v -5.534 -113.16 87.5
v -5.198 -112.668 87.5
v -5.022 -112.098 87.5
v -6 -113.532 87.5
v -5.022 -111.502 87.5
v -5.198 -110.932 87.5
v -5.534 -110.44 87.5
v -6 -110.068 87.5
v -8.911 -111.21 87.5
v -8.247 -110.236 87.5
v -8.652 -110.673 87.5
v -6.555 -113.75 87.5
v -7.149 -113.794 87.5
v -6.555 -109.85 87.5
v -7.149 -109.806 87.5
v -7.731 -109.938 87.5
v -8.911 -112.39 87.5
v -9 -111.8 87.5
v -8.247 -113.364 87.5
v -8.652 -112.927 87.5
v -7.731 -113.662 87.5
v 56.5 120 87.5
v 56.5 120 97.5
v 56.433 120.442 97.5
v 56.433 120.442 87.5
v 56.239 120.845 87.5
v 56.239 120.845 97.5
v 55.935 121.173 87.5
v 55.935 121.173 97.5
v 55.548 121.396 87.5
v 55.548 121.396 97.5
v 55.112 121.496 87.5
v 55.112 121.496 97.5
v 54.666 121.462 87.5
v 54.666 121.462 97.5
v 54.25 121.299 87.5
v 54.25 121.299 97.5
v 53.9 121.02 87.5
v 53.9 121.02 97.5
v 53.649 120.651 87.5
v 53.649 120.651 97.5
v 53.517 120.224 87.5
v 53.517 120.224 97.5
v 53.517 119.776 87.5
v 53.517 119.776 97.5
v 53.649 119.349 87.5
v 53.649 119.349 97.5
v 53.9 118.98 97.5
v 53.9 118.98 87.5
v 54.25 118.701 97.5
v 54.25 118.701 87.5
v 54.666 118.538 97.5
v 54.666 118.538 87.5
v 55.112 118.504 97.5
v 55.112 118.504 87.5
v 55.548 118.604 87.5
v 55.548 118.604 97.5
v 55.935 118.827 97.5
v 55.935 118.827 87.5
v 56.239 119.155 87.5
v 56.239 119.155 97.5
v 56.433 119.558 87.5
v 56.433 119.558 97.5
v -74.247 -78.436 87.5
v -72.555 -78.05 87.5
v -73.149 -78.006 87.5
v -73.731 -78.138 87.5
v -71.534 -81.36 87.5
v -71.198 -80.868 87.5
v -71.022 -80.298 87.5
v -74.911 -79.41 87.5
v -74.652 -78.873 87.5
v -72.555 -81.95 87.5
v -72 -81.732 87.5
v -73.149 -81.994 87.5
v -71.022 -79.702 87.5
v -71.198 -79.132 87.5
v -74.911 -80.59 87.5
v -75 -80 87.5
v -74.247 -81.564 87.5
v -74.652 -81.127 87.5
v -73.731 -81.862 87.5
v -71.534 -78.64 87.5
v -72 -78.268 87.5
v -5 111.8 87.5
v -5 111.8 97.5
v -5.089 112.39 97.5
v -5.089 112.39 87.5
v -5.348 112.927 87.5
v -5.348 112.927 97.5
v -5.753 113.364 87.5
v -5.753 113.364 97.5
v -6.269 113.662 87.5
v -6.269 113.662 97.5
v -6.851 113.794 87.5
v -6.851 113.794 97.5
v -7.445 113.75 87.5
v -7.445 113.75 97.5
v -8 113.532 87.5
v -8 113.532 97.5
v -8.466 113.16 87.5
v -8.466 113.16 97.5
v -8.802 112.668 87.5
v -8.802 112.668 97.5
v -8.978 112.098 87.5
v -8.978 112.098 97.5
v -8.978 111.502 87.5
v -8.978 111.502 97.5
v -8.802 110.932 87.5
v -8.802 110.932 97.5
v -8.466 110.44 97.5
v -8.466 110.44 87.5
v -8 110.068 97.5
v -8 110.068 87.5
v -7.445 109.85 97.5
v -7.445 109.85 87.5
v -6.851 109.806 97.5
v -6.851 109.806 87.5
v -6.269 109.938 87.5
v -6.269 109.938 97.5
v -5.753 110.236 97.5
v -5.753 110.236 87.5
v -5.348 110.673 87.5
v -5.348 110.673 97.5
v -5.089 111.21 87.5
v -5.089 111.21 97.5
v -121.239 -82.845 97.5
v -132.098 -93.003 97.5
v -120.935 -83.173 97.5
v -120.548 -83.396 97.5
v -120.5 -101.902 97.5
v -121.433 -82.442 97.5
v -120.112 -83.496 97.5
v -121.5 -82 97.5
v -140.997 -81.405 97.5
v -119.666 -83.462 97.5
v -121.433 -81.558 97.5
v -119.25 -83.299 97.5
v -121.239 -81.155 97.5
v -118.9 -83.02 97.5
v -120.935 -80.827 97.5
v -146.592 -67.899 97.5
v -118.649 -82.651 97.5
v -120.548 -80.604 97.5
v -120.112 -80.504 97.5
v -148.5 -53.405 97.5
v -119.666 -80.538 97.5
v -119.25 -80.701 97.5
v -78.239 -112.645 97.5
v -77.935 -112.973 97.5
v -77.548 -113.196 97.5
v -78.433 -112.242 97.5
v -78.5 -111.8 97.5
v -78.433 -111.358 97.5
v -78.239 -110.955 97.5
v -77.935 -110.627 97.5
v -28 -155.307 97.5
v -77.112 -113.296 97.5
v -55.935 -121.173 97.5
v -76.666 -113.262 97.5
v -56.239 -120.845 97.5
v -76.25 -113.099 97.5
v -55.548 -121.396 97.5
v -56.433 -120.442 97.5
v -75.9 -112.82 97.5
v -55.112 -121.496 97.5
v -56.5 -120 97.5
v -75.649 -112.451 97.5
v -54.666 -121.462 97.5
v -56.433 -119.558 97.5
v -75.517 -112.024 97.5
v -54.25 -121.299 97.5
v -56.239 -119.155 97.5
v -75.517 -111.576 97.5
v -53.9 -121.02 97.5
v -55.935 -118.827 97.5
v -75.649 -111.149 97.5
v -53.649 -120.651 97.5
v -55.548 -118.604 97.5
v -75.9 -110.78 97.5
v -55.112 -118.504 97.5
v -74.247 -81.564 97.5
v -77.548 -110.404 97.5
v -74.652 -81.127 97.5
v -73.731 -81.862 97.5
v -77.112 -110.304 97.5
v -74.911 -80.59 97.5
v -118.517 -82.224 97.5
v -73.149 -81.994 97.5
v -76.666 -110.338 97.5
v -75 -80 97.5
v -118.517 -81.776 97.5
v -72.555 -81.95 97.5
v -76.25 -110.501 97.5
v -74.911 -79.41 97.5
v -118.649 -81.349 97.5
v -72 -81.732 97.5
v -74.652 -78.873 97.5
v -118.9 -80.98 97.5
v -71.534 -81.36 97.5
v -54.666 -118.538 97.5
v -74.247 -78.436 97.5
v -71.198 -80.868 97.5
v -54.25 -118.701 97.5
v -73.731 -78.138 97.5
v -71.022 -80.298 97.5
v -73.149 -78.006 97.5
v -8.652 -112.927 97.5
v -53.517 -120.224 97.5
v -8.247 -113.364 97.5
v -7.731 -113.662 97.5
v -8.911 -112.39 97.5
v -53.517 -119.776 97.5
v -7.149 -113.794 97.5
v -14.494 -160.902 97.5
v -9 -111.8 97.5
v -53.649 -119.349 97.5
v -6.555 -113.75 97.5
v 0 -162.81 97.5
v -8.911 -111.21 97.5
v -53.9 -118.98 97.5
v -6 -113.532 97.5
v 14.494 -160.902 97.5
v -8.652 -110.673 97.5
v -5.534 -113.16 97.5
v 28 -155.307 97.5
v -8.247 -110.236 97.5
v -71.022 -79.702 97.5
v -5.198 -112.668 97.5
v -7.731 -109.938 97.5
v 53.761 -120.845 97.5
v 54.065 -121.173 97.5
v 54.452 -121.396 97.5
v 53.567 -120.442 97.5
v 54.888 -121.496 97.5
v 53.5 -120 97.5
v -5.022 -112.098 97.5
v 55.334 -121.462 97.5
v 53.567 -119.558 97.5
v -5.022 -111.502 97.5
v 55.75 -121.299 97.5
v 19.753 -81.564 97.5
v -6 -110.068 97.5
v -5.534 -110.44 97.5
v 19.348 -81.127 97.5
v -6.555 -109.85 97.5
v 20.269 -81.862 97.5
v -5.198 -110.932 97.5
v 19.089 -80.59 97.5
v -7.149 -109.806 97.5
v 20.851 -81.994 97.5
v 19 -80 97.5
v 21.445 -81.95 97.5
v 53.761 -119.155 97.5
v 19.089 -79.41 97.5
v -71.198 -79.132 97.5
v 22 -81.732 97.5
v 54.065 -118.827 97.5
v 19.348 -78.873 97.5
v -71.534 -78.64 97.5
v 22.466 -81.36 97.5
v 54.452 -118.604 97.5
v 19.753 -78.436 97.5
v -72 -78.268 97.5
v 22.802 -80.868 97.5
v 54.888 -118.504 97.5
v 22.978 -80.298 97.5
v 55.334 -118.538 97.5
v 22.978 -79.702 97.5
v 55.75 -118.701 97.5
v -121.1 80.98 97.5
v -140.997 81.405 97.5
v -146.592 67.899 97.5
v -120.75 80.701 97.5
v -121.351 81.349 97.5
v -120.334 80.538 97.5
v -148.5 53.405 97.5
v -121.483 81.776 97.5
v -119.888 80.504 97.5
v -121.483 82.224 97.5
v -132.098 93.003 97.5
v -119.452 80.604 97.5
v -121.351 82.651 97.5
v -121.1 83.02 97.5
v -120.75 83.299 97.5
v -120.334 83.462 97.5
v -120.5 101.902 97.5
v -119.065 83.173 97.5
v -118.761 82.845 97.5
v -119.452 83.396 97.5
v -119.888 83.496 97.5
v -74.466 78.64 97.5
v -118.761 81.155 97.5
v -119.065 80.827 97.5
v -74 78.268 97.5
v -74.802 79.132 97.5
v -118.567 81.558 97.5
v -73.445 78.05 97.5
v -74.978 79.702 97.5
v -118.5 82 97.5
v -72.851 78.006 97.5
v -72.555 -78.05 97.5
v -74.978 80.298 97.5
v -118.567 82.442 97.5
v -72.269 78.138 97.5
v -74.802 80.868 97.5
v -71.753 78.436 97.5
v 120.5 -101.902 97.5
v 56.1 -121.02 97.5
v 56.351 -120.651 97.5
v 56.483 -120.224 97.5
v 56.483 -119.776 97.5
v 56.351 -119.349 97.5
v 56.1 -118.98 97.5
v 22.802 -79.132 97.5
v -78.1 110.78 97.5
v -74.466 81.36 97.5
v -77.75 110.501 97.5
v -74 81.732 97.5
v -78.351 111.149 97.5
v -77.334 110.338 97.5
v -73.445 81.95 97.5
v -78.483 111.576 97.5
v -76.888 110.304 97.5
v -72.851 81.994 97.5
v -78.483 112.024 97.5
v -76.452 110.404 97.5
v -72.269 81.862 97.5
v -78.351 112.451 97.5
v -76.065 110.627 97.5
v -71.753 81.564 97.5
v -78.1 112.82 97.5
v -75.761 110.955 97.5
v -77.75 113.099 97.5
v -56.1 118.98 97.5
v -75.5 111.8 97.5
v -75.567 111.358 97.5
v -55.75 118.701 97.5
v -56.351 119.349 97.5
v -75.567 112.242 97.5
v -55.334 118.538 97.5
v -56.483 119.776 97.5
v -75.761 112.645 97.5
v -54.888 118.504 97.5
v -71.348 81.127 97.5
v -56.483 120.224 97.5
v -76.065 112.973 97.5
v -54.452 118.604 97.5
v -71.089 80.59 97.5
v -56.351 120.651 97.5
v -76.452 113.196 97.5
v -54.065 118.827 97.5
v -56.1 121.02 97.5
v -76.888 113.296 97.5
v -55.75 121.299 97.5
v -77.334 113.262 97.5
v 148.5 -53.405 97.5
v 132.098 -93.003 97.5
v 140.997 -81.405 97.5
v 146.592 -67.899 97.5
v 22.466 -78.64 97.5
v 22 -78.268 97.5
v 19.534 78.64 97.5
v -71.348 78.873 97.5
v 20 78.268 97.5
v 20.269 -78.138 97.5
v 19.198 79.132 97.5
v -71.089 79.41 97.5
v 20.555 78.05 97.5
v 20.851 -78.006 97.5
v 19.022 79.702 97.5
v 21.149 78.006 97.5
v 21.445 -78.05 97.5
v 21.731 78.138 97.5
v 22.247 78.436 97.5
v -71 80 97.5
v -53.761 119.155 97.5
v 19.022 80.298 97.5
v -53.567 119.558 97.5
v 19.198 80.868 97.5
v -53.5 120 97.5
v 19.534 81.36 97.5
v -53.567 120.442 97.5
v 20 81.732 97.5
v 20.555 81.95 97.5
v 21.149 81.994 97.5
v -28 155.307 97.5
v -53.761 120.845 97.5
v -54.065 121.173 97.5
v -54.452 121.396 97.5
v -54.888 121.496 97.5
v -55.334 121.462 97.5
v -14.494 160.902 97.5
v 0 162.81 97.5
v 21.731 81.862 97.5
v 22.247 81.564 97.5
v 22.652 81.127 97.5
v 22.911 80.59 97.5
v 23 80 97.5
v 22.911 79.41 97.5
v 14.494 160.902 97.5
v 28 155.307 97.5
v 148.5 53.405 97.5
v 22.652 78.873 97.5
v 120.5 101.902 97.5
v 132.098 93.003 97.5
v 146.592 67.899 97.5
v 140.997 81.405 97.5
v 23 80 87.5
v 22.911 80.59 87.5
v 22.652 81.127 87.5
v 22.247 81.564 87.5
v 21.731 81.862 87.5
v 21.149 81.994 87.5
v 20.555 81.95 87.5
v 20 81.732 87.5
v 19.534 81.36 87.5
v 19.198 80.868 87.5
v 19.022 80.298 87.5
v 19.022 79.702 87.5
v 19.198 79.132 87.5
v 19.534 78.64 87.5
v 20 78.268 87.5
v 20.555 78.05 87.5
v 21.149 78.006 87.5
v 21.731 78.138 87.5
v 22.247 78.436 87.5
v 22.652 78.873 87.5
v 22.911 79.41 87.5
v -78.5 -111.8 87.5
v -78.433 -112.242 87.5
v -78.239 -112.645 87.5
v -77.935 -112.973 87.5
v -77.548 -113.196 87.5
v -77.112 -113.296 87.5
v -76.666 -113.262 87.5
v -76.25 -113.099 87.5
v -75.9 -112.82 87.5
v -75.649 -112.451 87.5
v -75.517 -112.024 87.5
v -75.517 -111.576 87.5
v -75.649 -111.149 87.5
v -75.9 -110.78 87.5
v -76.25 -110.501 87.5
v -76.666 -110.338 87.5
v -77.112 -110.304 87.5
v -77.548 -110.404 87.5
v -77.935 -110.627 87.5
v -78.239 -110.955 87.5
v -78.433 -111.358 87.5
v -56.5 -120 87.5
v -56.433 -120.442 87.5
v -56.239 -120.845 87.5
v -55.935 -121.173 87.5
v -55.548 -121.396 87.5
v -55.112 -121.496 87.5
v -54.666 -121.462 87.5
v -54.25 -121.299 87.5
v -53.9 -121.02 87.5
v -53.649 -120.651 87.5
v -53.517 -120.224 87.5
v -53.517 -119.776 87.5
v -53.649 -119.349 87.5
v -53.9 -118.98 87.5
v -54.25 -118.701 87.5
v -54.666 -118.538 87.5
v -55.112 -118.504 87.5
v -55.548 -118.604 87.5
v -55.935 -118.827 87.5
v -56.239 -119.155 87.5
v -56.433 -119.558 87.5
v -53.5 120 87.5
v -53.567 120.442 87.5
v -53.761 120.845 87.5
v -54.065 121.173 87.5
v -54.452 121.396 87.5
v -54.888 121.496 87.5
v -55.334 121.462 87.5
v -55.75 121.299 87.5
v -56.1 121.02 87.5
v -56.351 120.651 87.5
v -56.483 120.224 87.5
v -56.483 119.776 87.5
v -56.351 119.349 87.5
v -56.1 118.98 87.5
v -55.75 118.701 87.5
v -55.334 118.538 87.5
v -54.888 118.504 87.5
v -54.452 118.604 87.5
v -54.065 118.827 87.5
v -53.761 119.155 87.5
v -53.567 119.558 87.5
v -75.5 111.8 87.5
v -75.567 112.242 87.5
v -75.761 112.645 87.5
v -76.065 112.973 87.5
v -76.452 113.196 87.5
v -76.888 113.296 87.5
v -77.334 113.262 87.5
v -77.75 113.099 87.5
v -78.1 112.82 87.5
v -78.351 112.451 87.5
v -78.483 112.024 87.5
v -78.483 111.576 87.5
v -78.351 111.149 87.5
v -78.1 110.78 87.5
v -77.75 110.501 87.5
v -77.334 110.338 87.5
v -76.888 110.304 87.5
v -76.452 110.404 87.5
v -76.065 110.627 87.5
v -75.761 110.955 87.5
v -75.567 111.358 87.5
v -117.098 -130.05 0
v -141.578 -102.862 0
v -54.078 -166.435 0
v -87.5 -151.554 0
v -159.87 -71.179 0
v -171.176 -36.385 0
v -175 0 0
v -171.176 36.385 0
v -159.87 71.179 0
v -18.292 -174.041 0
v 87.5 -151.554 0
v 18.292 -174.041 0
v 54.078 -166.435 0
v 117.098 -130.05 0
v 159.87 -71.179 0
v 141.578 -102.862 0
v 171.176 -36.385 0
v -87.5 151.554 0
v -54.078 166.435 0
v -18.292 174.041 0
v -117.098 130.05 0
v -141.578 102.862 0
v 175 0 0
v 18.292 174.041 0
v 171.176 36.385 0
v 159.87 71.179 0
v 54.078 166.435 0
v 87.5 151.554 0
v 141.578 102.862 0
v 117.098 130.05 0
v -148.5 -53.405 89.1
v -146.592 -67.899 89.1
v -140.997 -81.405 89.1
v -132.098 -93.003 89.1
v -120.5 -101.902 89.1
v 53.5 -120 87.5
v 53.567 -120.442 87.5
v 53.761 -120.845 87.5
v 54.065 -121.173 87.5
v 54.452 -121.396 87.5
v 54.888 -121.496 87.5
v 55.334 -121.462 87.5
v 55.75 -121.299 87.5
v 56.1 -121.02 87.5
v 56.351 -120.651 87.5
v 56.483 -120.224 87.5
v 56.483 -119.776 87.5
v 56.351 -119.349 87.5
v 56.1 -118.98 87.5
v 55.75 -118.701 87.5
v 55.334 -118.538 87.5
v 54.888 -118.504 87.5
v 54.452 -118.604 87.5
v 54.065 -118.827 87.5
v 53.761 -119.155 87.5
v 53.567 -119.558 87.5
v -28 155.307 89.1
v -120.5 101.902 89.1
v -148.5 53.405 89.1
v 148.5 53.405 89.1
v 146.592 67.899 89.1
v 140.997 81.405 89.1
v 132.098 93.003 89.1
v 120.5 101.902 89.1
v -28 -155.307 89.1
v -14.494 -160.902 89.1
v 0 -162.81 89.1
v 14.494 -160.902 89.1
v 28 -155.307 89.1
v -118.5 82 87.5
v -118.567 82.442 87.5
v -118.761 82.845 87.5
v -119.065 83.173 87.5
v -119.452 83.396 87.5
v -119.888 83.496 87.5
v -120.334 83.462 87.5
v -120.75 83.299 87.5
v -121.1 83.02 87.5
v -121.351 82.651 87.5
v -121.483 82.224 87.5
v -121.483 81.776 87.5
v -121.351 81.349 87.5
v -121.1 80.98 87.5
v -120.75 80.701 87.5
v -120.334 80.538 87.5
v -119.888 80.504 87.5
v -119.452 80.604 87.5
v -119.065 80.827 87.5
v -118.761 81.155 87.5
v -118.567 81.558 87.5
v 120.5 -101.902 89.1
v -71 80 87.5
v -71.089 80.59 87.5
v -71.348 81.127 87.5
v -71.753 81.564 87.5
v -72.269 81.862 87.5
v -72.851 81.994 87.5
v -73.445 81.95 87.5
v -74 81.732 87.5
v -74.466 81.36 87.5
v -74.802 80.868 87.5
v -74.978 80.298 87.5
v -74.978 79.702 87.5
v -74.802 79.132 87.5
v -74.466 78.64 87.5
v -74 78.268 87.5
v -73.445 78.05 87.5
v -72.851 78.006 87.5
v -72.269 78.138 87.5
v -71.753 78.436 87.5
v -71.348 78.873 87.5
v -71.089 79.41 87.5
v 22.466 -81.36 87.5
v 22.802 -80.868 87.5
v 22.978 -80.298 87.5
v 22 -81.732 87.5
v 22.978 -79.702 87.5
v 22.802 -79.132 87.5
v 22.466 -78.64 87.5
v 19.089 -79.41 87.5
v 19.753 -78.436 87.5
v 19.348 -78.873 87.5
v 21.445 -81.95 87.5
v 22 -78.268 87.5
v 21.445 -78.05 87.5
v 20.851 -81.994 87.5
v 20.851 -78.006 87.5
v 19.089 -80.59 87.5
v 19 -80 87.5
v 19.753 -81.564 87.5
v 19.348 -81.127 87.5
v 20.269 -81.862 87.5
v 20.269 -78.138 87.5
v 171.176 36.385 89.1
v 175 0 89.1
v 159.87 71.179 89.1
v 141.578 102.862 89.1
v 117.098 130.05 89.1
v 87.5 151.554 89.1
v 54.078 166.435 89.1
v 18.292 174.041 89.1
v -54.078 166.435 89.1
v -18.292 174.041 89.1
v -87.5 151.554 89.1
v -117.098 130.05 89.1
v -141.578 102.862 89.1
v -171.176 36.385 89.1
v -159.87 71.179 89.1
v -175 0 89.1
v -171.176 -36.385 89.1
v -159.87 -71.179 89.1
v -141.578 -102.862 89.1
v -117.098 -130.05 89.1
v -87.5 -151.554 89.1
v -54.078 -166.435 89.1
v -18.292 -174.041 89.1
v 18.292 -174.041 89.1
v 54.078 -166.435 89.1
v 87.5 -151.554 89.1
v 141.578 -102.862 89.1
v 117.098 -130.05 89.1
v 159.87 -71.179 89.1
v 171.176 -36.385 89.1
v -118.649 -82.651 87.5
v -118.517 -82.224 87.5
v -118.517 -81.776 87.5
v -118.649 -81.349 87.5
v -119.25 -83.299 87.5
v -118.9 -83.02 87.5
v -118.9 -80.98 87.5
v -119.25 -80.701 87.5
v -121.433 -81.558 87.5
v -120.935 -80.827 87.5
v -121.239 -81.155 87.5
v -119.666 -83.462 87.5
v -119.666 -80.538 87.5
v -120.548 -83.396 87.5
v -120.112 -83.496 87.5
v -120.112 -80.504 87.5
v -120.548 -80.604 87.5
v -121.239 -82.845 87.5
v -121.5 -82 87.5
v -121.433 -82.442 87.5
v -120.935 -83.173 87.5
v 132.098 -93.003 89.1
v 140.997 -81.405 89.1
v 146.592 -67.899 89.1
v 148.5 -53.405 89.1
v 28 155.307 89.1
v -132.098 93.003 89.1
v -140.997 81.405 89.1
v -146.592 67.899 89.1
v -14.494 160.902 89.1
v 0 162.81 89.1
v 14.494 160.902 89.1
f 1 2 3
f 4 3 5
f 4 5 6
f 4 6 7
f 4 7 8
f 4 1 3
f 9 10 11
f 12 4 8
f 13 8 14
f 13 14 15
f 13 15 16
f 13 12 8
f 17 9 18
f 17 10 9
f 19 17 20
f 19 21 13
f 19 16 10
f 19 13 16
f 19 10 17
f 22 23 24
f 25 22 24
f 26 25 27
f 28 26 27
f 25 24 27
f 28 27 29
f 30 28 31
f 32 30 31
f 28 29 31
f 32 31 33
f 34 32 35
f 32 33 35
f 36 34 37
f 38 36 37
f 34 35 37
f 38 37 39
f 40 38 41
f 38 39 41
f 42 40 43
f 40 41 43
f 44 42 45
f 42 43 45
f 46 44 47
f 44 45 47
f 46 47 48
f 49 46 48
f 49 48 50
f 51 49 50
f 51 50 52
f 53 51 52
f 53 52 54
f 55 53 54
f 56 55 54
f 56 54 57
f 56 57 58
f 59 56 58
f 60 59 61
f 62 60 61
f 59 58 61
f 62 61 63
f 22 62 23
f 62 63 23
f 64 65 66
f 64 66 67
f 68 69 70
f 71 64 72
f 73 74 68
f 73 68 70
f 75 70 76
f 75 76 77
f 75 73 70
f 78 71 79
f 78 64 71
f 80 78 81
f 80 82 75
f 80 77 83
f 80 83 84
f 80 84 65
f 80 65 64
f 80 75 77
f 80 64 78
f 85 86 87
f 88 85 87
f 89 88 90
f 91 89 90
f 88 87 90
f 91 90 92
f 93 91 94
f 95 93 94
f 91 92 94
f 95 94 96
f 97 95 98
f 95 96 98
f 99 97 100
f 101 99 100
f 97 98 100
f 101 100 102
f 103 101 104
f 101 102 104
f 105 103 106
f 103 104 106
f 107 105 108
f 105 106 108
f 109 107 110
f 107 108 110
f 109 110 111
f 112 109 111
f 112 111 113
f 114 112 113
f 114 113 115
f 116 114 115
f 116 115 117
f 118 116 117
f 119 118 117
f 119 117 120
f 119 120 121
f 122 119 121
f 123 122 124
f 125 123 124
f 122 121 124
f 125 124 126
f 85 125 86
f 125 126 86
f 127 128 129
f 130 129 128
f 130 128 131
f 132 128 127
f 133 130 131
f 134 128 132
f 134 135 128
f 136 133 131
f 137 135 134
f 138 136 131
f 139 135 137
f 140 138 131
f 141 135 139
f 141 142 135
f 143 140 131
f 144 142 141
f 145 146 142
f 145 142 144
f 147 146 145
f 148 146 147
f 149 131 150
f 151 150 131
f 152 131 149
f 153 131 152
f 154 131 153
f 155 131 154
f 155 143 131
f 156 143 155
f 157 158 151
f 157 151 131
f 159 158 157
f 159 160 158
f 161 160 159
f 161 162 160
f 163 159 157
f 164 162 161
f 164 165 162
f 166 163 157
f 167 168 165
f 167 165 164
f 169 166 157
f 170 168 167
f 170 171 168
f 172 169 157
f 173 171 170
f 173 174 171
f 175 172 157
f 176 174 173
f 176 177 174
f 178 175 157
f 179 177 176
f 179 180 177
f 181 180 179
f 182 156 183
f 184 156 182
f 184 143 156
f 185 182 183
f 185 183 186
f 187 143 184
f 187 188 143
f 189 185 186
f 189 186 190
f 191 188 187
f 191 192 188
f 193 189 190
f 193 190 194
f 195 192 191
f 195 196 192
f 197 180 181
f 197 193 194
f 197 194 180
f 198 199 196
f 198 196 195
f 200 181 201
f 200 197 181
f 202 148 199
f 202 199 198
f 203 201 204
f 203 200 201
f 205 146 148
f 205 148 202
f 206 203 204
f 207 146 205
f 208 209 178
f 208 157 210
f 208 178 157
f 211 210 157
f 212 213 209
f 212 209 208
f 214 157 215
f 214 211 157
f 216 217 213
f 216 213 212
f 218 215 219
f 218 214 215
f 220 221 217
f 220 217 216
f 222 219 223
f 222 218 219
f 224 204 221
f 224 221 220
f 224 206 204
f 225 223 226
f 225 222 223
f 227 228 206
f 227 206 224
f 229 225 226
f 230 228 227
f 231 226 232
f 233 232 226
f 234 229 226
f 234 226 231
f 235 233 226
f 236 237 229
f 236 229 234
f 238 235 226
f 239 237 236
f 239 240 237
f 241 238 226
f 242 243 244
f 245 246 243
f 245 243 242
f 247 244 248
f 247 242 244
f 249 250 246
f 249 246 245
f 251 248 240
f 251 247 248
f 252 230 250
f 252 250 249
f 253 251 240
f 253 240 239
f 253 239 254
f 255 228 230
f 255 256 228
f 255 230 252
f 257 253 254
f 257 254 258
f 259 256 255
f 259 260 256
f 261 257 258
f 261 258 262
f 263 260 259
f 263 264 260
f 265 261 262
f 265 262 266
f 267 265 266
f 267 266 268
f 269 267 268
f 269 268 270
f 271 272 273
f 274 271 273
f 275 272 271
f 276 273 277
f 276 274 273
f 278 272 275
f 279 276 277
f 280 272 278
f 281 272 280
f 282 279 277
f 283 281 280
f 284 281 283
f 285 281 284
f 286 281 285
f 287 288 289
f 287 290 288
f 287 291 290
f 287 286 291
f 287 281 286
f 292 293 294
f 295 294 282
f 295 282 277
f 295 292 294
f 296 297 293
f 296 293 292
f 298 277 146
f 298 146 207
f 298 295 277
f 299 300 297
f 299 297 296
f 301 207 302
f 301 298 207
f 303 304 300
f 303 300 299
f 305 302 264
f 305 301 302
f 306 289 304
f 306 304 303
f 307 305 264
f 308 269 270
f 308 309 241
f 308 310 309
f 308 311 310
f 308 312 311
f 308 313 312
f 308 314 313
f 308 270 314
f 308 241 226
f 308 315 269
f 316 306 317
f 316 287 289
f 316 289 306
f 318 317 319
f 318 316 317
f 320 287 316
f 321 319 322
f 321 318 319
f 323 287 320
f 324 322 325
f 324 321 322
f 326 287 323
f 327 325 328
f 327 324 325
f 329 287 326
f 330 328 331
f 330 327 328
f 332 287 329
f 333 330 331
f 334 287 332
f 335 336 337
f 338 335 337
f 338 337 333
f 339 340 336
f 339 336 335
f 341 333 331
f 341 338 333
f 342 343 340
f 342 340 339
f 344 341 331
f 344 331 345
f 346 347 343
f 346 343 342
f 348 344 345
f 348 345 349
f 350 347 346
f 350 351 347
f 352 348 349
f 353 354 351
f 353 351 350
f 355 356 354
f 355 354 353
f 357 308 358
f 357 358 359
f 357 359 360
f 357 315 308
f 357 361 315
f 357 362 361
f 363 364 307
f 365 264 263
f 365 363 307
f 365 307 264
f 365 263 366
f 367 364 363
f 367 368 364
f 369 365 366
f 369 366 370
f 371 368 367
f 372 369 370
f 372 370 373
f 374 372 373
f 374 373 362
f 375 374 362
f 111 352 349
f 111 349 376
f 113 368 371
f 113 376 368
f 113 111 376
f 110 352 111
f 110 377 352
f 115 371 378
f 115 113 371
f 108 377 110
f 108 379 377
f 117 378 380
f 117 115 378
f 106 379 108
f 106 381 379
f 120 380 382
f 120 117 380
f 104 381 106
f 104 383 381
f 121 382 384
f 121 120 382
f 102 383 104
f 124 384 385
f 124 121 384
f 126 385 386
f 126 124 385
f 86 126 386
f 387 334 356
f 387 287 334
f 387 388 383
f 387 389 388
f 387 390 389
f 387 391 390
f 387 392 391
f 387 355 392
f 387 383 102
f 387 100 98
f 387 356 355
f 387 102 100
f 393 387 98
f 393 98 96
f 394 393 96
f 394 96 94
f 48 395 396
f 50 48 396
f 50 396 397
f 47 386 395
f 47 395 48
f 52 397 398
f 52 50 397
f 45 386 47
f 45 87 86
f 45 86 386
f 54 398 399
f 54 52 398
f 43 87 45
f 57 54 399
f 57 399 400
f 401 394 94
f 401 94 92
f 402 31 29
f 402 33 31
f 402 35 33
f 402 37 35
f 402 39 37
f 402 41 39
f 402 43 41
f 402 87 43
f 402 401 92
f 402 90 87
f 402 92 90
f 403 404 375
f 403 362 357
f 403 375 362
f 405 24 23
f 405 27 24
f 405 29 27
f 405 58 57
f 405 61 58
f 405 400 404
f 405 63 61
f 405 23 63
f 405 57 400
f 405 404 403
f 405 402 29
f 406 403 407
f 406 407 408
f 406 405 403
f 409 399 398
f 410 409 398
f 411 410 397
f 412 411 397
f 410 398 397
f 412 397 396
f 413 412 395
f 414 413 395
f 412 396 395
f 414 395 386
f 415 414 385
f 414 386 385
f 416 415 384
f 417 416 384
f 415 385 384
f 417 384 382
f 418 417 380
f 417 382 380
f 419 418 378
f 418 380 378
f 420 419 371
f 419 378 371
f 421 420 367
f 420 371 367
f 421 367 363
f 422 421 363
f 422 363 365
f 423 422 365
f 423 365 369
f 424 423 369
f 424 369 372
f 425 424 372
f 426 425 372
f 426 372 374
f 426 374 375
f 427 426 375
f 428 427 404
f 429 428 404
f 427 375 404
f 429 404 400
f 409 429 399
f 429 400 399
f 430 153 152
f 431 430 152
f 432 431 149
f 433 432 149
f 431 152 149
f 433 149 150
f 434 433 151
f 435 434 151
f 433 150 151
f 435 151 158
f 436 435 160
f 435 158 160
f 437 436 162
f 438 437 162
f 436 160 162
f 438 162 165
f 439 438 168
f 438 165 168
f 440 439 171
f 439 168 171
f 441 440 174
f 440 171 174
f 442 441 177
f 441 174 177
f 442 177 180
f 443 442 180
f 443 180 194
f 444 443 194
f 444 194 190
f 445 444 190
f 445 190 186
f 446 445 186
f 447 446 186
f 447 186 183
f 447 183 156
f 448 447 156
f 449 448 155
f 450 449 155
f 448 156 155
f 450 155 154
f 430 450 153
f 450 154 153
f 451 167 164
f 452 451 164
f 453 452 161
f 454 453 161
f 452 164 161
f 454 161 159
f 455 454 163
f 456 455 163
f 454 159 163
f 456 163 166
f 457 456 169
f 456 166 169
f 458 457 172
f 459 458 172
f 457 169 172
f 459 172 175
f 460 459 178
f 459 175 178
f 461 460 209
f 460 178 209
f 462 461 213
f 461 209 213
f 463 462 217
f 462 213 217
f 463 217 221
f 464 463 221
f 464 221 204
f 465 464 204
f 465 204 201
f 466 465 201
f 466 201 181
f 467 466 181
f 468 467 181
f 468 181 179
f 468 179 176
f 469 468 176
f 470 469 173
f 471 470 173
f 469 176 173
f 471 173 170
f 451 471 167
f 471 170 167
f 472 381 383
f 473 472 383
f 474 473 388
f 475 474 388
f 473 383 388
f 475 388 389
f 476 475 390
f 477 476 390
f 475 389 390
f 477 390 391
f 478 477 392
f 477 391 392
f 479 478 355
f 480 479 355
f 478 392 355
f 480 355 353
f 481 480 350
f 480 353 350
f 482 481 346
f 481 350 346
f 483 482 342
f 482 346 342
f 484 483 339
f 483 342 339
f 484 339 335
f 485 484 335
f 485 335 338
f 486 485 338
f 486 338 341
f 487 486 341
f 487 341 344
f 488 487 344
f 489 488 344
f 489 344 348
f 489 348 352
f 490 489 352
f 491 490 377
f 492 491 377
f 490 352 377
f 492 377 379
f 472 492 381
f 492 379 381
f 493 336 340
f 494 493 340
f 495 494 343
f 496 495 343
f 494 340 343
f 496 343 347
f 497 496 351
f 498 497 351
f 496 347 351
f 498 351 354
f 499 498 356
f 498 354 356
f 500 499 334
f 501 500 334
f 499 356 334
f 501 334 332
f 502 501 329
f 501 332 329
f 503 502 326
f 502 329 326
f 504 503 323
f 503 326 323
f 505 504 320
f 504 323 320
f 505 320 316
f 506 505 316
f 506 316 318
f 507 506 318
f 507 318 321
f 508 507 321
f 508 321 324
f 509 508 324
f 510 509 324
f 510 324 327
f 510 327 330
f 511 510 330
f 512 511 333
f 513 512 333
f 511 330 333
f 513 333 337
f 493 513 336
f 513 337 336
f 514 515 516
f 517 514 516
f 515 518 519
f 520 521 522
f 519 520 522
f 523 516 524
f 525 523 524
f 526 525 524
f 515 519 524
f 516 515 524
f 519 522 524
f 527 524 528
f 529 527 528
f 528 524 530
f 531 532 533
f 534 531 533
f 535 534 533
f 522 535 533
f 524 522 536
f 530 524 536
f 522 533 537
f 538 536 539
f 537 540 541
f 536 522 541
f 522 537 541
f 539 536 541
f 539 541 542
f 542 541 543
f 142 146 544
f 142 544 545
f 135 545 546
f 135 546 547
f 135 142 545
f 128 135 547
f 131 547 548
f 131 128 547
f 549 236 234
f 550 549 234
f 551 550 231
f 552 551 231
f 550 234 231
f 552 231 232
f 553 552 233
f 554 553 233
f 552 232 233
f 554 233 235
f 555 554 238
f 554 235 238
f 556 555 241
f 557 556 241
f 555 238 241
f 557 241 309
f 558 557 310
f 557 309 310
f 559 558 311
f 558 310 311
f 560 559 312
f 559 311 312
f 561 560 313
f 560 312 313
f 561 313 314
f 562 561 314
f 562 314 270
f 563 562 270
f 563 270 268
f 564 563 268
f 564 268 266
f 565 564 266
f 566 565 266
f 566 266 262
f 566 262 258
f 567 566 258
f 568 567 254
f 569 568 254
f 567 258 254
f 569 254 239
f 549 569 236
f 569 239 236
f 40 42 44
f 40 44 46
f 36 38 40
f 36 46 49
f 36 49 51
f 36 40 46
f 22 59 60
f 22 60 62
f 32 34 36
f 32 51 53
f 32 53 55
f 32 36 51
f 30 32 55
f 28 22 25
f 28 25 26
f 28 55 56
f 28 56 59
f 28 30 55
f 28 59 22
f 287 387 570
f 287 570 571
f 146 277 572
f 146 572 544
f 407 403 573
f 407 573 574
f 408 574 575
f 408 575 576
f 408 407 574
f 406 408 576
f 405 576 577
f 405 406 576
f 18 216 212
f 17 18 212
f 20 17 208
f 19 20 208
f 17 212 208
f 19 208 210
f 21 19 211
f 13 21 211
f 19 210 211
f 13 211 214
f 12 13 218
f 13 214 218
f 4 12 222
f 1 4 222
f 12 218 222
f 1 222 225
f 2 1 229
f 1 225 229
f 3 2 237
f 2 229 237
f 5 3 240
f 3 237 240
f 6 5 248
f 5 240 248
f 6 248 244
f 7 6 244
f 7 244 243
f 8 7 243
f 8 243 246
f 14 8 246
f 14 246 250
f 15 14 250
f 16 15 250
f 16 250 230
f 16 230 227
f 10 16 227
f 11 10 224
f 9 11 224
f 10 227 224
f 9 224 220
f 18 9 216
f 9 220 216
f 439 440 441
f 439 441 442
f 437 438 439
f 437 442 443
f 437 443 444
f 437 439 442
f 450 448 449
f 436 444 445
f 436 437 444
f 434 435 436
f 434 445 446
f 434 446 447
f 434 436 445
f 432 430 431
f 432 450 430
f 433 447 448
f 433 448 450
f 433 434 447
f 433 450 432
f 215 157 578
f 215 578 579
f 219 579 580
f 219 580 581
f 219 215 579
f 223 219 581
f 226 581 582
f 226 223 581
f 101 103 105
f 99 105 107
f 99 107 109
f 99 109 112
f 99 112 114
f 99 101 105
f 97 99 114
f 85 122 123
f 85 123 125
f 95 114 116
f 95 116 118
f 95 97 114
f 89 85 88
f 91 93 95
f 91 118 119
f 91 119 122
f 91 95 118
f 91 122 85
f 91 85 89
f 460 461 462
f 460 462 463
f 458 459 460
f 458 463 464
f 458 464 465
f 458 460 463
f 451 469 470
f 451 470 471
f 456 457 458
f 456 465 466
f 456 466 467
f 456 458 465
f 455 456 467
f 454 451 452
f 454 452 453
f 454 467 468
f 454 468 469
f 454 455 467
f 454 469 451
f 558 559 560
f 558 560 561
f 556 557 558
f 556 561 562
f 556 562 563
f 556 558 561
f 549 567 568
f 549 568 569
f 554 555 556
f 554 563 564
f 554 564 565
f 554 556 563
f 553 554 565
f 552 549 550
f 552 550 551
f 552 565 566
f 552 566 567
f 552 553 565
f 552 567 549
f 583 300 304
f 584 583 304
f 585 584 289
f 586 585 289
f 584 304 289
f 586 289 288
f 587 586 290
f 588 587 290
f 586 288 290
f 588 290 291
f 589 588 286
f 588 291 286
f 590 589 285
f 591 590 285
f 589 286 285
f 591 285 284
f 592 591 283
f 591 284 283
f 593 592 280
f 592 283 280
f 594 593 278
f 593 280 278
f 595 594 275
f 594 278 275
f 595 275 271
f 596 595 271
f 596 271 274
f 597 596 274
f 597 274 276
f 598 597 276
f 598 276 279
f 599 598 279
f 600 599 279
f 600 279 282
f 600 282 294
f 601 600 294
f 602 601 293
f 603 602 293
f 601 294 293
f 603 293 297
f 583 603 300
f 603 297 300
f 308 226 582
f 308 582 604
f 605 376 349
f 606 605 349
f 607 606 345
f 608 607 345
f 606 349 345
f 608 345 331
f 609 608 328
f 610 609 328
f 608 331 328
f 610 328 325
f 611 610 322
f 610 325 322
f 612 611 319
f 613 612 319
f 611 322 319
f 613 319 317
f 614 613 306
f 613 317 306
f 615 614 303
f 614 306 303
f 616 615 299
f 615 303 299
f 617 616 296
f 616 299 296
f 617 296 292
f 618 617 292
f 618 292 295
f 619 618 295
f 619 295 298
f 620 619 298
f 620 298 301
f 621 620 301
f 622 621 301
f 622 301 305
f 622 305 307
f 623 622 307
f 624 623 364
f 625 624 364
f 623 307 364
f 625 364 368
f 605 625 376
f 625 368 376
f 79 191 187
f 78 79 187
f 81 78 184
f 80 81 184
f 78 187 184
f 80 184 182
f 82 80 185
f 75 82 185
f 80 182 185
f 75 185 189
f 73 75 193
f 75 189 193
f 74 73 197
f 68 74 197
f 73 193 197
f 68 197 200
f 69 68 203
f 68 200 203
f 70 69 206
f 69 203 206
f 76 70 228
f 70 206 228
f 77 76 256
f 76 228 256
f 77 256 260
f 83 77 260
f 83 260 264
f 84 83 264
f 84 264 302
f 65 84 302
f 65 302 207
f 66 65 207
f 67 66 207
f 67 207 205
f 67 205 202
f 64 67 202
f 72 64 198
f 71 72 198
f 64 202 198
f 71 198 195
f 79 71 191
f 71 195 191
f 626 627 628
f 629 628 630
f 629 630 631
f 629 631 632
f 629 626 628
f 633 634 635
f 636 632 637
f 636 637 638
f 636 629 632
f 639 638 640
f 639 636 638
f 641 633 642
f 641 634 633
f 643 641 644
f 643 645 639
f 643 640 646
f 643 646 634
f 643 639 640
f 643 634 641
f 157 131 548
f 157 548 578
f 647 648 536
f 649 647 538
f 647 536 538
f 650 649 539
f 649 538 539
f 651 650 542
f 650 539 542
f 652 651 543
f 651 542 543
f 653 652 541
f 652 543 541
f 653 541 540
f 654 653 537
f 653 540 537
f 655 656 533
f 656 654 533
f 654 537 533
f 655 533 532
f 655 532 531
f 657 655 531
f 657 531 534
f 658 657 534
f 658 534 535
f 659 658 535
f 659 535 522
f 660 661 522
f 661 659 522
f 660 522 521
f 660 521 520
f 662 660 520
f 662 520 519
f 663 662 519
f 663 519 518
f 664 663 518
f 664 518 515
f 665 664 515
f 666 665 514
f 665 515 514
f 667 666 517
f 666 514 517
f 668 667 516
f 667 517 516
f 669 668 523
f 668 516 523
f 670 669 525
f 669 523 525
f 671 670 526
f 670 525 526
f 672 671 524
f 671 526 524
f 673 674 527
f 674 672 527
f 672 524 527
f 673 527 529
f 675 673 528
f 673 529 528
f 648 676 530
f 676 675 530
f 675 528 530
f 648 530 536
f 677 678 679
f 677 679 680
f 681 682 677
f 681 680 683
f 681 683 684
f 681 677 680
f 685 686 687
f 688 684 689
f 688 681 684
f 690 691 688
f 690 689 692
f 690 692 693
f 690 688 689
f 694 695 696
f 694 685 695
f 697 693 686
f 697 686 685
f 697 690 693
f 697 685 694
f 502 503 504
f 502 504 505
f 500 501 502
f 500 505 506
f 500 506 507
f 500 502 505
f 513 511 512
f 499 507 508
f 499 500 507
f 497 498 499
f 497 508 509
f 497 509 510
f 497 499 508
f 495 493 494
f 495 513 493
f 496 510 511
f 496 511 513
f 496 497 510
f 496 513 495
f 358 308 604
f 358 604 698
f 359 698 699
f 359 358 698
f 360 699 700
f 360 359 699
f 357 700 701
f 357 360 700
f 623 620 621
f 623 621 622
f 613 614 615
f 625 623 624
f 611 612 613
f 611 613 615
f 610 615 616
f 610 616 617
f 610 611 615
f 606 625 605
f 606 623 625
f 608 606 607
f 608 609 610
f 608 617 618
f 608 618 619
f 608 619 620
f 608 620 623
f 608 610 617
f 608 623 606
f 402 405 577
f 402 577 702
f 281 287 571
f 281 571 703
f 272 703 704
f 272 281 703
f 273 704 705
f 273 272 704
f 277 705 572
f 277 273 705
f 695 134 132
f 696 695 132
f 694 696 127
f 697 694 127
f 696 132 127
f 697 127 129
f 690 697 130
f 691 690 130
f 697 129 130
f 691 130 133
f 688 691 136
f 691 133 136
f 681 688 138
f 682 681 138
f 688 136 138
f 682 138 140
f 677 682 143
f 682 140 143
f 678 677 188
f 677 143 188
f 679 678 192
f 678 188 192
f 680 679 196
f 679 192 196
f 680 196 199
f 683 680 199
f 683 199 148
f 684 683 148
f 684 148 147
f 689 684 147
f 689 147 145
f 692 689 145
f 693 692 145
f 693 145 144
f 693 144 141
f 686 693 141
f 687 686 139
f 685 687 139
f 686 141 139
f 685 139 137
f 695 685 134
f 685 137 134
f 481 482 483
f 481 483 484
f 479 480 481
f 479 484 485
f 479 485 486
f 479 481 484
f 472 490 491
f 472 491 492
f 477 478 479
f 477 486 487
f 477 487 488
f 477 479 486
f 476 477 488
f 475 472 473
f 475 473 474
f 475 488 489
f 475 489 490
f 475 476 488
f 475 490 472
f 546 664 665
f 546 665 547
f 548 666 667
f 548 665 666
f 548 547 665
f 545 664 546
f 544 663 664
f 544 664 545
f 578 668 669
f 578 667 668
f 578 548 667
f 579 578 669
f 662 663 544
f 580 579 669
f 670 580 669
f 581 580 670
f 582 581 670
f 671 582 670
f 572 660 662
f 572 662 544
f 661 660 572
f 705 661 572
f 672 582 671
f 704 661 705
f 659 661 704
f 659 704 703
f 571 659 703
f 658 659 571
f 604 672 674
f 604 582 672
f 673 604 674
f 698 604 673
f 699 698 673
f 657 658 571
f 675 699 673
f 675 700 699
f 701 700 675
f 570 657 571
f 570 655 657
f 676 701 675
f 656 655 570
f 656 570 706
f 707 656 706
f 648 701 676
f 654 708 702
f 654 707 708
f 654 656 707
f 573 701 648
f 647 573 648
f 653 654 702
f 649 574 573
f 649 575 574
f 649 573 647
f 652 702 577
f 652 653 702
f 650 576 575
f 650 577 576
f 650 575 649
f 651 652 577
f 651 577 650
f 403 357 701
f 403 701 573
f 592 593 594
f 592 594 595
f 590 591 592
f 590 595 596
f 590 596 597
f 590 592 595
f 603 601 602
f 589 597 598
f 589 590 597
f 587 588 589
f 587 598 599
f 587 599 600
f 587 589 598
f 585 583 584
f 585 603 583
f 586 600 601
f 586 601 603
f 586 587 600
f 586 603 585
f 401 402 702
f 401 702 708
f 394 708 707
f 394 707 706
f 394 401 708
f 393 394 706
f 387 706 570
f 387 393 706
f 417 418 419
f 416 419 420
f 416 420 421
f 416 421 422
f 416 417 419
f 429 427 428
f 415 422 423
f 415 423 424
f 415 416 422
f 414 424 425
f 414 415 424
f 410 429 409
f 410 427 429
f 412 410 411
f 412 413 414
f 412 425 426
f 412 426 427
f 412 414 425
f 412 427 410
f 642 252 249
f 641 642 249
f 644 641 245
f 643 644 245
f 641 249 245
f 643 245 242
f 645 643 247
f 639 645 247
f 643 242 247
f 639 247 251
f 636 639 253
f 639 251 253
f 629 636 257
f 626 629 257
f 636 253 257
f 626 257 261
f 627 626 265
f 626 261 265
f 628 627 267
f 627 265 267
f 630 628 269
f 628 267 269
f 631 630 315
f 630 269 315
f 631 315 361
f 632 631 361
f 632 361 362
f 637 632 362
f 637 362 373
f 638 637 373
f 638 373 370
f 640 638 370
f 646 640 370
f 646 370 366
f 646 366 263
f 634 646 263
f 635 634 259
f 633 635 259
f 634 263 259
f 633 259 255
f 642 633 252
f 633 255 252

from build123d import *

# Parameters (mm, degrees)
ESBO_O1_R                = 175
RESSALTO_EXTRUS_O1_DEPTH = 97.5
ESBO_O4_R                = 1.5
ESBO_O4_R_2              = 2
CORTE_EXTRUS_O1_DEPTH    = 10
ESBO_O5_OUTSIDE_W        = 452.898
ESBO_O5_OUTSIDE_H        = 452.898
CORTE_EXTRUS_O2_DEPTH    = 8.4


with BuildPart() as part:
    # Esboço1 → Ressalto-extrusão1 (new body)
    with BuildSketch(Plane.XY):
        Circle(ESBO_O1_R)
    extrude(amount=RESSALTO_EXTRUS_O1_DEPTH)

    # Esboço4 → Corte-extrusão1 (cut)
    with BuildSketch(Plane.XY.offset(97.5)):
        with Locations((-120, 82)):
            Circle(ESBO_O4_R)
        with Locations((-55, 120)):
            Circle(ESBO_O4_R)
        with Locations((-77, 111.8)):
            Circle(ESBO_O4_R)
        with Locations((55, 120)):
            Circle(ESBO_O4_R)
        with Locations((-7, 111.8)):
            Circle(ESBO_O4_R_2)
        with Locations((-73, 80)):
            Circle(ESBO_O4_R_2)
        with Locations((21, 80)):
            Circle(ESBO_O4_R_2)
        with Locations(Location((21, -80, 0), (0, 0, 180))):
            Circle(ESBO_O4_R_2)
        with Locations(Location((-73, -80, 0), (0, 0, 180))):
            Circle(ESBO_O4_R_2)
        with Locations(Location((-7, -111.8, 0), (0, 0, 180))):
            Circle(ESBO_O4_R_2)
        with Locations(Location((55, -120, 0), (0, 0, 180))):
            Circle(ESBO_O4_R)
        with Locations(Location((-77, -111.8, 0), (0, 0, 180))):
            Circle(ESBO_O4_R)
        with Locations(Location((-55, -120, 0), (0, 0, 180))):
            Circle(ESBO_O4_R)
        with Locations(Location((-120, -82, 0), (0, 0, 180))):
            Circle(ESBO_O4_R)
    extrude(amount=-CORTE_EXTRUS_O1_DEPTH, mode=Mode.SUBTRACT)

    # Esboço5 outside → Corte-extrusão2 (cut)
    with BuildSketch(Plane.XY.offset(97.5)):
        Rectangle(ESBO_O5_OUTSIDE_W, ESBO_O5_OUTSIDE_H)
        with BuildLine():
            Line((28, -155.307222412), (120.5, -101.902322512))
            ThreePointArc((120.5, -101.902322512), (140.997422612, -81.4048999), (148.5, -53.4048999))
            Line((148.5, -53.4048999), (148.5, 53.4048999))
            ThreePointArc((148.5, 53.4048999), (140.997422612, 81.4048999), (120.5, 101.902322512))
            Line((120.5, 101.902322512), (28, 155.307222412))
            ThreePointArc((28, 155.307222412), (0, 162.8097998), (-28, 155.307222412))
            Line((-28, 155.307222412), (-120.5, 101.902322512))
            ThreePointArc((-120.5, 101.902322512), (-140.997422612, 81.4048999), (-148.5, 53.4048999))
            Line((-148.5, 53.4048999), (-148.5, -53.4048999))
            ThreePointArc((-148.5, -53.4048999), (-140.997422612, -81.4048999), (-120.5, -101.902322512))
            Line((-120.5, -101.902322512), (-28, -155.307222412))
            ThreePointArc((-28, -155.307222412), (0, -162.8097998), (28, -155.307222412))
        make_face(mode=Mode.SUBTRACT)
    extrude(amount=-CORTE_EXTRUS_O2_DEPTH, mode=Mode.SUBTRACT)


solid = part.part
